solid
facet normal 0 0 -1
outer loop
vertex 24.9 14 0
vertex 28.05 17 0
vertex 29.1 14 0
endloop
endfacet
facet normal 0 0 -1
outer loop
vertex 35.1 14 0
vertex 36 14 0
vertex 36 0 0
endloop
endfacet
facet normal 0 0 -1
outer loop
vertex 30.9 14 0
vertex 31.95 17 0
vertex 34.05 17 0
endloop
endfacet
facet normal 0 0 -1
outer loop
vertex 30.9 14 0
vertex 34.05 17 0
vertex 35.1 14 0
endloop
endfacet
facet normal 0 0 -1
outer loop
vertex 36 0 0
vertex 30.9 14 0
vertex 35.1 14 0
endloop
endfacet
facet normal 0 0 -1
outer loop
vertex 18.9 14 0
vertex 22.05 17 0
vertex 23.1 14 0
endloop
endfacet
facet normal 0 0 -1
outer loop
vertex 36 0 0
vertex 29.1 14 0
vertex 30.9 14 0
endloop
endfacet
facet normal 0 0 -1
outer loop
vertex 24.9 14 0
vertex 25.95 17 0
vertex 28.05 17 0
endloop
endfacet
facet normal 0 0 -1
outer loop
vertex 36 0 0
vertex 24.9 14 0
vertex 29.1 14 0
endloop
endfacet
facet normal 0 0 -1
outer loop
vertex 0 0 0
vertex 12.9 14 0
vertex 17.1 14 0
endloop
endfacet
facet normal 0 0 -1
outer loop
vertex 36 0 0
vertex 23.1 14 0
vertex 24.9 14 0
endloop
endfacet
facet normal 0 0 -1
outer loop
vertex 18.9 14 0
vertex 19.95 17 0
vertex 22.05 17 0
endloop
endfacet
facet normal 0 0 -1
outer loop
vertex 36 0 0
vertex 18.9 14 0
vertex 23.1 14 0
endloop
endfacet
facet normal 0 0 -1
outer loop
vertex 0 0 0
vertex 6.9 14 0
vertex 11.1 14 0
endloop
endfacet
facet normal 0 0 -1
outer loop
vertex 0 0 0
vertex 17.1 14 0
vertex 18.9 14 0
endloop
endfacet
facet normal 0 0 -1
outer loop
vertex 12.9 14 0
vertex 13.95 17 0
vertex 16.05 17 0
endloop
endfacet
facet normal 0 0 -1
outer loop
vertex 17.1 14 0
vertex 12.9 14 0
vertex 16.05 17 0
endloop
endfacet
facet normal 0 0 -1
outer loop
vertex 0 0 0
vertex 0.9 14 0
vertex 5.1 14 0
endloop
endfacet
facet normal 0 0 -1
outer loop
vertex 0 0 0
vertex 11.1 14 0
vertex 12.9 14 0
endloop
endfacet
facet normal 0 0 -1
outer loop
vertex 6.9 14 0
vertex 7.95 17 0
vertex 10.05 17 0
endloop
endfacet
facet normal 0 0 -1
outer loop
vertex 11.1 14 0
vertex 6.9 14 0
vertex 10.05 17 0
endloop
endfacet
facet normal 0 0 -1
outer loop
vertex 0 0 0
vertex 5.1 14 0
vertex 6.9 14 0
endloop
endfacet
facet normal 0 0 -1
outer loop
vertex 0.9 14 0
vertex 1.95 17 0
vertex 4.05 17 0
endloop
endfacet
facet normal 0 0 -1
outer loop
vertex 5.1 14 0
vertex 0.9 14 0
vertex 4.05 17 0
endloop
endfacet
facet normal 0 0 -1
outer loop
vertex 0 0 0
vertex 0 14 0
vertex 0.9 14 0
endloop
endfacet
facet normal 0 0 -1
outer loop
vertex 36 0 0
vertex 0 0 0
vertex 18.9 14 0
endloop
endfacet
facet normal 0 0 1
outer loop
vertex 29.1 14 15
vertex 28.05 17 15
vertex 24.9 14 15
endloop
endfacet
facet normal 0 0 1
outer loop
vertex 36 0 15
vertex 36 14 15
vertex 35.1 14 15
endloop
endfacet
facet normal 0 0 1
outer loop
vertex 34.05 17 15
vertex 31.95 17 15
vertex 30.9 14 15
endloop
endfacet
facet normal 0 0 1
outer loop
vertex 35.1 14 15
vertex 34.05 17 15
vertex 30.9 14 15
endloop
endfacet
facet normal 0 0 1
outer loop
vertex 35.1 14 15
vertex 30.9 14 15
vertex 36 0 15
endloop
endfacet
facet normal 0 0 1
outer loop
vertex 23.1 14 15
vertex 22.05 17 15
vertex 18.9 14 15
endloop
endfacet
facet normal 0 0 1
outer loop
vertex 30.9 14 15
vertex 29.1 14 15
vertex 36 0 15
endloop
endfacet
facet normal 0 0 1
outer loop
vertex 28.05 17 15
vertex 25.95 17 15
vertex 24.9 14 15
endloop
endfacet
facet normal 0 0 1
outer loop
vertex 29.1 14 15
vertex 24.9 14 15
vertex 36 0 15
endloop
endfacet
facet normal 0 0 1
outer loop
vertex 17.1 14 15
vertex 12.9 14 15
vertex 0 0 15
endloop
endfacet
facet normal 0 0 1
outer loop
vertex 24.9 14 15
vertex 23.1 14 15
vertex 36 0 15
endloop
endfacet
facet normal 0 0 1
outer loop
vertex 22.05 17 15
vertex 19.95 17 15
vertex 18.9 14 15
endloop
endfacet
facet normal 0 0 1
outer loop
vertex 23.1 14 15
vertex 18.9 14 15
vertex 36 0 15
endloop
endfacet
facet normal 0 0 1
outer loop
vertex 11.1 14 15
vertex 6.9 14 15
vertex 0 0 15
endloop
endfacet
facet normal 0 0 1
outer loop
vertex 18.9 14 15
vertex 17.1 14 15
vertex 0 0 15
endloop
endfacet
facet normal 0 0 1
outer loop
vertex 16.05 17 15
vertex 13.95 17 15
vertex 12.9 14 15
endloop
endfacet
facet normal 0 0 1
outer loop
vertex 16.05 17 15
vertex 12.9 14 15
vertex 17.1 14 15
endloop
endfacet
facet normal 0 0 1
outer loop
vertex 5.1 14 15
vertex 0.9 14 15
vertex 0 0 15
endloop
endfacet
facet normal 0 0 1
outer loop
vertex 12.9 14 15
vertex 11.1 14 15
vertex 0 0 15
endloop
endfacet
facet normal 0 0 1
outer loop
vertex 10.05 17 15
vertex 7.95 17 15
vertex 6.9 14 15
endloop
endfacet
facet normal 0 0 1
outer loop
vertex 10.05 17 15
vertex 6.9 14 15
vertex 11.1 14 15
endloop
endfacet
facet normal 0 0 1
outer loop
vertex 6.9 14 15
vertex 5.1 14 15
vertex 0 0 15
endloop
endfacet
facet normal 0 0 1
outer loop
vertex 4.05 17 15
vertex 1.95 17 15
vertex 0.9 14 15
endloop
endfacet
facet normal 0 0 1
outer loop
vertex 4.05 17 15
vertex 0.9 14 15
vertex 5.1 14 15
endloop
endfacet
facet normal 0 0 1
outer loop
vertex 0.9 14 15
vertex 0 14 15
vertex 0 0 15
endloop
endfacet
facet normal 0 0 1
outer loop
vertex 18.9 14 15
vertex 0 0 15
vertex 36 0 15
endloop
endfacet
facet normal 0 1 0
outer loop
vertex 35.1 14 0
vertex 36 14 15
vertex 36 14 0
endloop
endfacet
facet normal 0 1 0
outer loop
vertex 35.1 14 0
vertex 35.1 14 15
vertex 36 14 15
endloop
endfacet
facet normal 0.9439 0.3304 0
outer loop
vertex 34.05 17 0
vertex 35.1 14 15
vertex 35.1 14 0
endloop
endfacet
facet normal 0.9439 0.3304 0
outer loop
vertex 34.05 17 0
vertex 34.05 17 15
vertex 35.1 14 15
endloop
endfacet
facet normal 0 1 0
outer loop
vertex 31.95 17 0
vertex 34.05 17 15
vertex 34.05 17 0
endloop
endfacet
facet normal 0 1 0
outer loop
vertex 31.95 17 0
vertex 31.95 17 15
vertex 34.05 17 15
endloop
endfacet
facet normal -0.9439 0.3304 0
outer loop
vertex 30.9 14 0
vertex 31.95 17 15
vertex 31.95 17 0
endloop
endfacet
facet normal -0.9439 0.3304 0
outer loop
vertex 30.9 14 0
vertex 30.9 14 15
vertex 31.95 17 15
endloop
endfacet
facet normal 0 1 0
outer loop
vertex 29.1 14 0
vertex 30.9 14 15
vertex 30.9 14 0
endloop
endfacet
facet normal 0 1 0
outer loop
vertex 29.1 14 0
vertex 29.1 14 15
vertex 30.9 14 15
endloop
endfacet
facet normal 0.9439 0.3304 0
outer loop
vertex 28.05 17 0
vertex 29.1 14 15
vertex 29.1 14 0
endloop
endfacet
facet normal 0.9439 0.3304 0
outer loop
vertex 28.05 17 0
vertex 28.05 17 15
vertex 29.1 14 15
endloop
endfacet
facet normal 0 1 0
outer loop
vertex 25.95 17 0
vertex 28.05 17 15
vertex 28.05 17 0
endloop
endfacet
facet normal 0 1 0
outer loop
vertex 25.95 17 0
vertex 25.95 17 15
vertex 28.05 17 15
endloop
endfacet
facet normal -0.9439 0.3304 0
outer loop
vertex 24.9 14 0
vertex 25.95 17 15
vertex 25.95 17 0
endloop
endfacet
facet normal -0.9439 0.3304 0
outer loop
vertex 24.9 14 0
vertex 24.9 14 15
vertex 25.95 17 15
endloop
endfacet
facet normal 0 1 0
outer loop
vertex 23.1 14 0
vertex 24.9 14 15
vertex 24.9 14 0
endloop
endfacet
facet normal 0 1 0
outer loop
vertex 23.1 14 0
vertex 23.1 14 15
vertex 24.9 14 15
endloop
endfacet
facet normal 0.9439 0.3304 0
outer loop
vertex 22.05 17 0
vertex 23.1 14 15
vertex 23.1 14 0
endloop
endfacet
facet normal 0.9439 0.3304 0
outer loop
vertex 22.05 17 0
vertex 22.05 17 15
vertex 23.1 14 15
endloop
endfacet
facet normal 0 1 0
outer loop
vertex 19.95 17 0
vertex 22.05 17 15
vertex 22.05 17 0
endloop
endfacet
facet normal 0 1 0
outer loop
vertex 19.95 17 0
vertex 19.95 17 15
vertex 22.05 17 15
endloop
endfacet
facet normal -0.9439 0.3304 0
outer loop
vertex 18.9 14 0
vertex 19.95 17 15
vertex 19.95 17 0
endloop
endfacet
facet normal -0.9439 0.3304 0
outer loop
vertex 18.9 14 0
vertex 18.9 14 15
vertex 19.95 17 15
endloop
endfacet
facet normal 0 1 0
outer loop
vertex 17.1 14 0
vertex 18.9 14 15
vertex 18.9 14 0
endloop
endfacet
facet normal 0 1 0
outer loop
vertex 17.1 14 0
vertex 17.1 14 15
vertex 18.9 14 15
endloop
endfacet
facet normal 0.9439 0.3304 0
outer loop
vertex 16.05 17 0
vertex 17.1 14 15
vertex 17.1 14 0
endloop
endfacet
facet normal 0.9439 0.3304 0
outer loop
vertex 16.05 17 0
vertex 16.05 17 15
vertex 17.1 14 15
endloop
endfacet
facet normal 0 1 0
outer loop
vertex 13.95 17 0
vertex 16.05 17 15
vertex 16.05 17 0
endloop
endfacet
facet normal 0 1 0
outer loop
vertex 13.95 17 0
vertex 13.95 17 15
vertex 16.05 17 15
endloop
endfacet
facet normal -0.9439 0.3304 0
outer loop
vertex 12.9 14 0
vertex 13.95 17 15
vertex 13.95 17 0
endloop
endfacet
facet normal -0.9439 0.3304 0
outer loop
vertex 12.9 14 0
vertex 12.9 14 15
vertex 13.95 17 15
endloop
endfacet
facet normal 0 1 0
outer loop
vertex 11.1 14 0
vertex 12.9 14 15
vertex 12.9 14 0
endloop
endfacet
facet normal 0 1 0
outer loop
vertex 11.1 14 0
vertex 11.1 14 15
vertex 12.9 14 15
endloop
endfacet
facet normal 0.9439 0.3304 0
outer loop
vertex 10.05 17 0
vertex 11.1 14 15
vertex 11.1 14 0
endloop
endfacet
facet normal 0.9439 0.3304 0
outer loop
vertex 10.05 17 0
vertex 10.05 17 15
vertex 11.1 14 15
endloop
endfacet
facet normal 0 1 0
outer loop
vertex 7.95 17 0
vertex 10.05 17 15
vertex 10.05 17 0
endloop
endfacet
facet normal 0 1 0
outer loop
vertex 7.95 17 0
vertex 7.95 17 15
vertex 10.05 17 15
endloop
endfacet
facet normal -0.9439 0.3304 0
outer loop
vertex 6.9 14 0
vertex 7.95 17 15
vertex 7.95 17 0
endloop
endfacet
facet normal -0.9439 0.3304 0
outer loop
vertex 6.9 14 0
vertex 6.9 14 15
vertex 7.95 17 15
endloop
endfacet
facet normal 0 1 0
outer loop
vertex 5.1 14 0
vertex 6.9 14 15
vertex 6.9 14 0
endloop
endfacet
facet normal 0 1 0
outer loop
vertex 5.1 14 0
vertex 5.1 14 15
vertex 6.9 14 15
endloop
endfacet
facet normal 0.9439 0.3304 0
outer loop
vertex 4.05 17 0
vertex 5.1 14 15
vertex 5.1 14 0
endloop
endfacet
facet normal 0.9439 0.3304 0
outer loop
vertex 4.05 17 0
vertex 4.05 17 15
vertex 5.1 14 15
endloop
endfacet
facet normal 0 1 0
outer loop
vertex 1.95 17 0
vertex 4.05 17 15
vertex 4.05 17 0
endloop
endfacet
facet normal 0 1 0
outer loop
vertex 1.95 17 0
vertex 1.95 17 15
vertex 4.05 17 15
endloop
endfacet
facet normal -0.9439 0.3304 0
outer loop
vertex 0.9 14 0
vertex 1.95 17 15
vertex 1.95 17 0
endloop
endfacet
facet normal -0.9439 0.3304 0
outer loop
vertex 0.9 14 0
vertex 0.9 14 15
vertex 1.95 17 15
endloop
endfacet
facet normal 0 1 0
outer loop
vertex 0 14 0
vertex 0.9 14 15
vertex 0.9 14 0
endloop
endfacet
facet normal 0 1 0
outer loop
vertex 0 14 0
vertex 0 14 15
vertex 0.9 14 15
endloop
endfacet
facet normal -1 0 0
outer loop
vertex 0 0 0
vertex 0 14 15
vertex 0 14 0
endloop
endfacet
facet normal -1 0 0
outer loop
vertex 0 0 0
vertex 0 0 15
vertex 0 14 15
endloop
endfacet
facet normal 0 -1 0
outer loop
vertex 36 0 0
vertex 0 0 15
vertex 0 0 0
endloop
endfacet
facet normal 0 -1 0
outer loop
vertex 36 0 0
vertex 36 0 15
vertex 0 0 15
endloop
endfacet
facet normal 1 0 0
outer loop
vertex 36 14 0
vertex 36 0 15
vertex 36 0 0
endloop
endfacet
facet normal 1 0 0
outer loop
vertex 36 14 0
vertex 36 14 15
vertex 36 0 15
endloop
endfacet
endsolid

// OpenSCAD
$fn = 32;

// ----------------------------------------------------------------------
// Gear rack: 6 teeth, pitch 6 mm
// ----------------------------------------------------------------------

// --- parameters (mm) ---
teeth = 6;                // number of teeth
pitch = 6;                // tooth pitch, X
root_w = 4.2;             // tooth width at the root
tip_w = 2.1;              // tooth width at the tip
base_h = 14;              // rack body height, Y
tooth_h = 3;              // tooth height above the body
plate_t = 15;             // rack width, Z (extrusion height)

rack_l = teeth * pitch;  // overall length
total_h = base_h + tooth_h;  // overall height

profile = [[0, 0], [36, 0], [36, 14], [35.1, 14], [34.05, 17], [31.95, 17], [30.9, 14], [29.1, 14], [28.05, 17], [25.95, 17], [24.9, 14], [23.1, 14], [22.05, 17], [19.95, 17], [18.9, 14], [17.1, 14], [16.05, 17], [13.95, 17], [12.9, 14], [11.1, 14], [10.05, 17], [7.95, 17], [6.9, 14], [5.1, 14], [4.05, 17], [1.95, 17], [0.9, 14], [0, 14]];  // primary outline, 28 points, counter clockwise

// --- the one profile operation ---
linear_extrude(height = plate_t) polygon(points = profile);
